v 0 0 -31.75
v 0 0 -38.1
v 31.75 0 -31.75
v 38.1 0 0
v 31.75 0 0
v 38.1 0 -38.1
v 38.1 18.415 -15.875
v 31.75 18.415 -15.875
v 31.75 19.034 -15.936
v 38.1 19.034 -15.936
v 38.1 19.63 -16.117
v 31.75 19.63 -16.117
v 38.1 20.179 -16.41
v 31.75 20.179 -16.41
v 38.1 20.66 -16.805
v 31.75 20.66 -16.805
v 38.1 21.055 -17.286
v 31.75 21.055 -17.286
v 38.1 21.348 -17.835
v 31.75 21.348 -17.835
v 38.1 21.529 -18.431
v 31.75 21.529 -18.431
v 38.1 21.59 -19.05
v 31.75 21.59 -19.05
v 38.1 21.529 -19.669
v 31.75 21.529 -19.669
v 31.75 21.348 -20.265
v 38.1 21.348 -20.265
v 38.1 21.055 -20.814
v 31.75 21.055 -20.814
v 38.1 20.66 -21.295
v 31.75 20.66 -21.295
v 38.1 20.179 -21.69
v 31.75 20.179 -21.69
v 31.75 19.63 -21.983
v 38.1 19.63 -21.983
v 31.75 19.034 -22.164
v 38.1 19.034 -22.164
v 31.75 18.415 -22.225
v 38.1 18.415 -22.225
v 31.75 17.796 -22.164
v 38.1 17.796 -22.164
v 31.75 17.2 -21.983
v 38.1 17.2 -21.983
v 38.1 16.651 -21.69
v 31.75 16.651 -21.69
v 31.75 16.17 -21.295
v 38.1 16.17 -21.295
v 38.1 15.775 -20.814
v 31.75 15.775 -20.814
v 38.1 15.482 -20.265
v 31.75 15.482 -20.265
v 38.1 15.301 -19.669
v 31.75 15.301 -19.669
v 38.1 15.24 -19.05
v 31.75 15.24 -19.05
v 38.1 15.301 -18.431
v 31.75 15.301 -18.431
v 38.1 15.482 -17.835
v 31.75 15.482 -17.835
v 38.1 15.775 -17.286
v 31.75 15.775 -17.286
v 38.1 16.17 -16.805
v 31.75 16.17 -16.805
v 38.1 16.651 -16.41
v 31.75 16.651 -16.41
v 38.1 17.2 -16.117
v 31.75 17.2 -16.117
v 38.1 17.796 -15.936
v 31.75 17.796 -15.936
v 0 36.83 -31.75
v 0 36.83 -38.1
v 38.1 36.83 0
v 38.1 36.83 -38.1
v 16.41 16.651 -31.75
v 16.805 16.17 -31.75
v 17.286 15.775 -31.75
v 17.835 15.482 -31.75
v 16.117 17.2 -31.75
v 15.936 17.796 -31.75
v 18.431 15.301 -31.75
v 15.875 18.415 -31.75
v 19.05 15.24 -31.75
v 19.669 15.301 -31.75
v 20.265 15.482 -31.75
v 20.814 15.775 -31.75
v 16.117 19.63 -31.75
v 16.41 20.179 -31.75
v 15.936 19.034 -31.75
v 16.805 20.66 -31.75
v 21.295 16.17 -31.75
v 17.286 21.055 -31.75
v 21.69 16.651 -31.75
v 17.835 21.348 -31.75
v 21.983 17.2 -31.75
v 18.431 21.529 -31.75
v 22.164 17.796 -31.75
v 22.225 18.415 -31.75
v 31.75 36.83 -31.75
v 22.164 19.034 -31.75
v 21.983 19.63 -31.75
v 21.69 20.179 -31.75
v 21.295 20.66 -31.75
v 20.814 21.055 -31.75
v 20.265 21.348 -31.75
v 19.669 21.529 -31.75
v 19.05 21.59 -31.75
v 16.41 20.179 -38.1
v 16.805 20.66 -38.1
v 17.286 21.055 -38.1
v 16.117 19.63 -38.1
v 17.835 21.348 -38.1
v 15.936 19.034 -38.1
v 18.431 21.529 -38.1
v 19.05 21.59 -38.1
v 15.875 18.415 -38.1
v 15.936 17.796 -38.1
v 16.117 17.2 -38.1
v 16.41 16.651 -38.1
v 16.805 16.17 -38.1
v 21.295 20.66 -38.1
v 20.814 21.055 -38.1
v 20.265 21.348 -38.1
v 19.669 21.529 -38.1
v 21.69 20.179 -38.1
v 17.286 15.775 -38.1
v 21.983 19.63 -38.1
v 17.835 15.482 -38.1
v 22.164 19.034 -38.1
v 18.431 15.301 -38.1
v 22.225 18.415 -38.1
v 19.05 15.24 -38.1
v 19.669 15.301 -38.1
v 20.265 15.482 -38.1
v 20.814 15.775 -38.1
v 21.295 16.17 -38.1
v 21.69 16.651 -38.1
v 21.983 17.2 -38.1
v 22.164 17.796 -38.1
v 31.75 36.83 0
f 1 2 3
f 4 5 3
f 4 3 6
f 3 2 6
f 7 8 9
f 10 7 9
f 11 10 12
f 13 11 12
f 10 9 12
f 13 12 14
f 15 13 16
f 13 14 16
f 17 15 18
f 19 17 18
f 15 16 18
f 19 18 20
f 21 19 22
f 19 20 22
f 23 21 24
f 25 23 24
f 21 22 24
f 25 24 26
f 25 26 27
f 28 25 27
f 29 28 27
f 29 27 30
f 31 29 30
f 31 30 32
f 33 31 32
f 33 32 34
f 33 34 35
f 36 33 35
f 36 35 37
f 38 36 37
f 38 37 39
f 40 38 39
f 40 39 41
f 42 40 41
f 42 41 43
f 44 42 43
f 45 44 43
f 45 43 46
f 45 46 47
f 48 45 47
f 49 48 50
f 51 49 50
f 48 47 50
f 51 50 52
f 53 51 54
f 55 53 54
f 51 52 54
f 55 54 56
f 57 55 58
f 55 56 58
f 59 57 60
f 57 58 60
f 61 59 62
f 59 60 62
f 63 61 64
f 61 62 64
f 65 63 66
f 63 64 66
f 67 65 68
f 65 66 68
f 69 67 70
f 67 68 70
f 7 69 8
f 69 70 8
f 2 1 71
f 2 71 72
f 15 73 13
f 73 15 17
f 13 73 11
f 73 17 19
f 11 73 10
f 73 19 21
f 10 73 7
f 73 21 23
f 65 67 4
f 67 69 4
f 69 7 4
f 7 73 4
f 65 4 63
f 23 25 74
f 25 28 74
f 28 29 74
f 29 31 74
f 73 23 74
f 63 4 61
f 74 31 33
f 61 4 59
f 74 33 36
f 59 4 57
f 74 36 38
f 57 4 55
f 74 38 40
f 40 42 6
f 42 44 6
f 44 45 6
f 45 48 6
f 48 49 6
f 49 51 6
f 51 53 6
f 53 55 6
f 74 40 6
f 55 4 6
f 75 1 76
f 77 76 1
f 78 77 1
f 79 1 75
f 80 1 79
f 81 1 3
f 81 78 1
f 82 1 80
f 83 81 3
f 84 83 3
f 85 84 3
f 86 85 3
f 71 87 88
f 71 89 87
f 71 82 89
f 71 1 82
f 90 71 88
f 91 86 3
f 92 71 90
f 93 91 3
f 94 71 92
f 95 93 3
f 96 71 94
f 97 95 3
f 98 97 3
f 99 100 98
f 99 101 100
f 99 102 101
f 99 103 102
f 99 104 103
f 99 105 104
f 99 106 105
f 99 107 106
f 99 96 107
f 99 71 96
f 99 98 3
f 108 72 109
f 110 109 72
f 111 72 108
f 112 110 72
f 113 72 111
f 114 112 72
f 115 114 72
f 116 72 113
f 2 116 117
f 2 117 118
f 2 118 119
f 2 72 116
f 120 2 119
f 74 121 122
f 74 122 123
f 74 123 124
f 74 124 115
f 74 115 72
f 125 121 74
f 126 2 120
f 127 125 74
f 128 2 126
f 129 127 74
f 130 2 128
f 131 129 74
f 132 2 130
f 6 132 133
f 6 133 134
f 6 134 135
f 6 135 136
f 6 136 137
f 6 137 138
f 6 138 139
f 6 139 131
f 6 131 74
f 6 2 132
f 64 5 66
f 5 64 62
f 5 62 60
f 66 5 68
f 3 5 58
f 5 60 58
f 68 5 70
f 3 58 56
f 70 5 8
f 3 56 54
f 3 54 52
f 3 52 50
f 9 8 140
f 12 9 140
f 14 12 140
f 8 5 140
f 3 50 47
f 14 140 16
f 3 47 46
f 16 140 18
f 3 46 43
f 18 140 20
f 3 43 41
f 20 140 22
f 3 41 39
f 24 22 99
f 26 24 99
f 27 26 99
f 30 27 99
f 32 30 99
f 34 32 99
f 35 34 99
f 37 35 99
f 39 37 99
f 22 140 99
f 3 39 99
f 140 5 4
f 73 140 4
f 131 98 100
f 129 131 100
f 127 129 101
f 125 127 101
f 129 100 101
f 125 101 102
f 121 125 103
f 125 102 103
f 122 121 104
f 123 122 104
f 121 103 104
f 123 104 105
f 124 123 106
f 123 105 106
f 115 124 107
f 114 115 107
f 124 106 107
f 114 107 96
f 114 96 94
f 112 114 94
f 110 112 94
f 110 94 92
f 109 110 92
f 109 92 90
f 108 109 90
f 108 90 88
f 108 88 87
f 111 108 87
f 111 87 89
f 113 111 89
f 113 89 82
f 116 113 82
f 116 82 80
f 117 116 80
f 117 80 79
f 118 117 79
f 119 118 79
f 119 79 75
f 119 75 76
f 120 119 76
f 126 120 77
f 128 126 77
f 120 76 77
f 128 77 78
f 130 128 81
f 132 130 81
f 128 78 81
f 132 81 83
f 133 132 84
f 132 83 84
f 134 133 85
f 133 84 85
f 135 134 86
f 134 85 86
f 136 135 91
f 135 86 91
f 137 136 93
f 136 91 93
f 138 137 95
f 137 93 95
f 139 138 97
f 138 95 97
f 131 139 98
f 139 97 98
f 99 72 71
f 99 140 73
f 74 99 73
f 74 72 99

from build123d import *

# Parameters (mm, degrees)
SKETCH1_W           = 38.1
SKETCH1_H           = 38.1
BOSS_EXTRUDE1_DEPTH = 36.83
SKETCH2_W           = 31.75
SKETCH2_H           = 31.75
CUT_EXTRUDE1_DEPTH  = 66.266139
SKETCH4_R           = 3.175
CUT_EXTRUDE2_DEPTH  = 62.774763456
SKETCH3_R           = 3.175
CUT_EXTRUDE3_DEPTH  = 62.774763456


with BuildPart() as part:
    # Sketch1 → Boss-Extrude1 (new body)
    with BuildSketch(Plane(origin=(0, 0, 0), x_dir=(1, 0, 0), z_dir=(0, 1, 0))):
        with Locations((19.05, 19.05)):
            Rectangle(SKETCH1_W, SKETCH1_H)
    extrude(amount=BOSS_EXTRUDE1_DEPTH)

    # Sketch2 → Cut-Extrude1 (cut, through all)
    with BuildSketch(Plane(origin=(0, 36.83, 0), x_dir=(1, 0, 0), z_dir=(0, 1, 0))):
        with Locations((15.875, 15.875)):
            Rectangle(SKETCH2_W, SKETCH2_H)
    extrude(amount=-CUT_EXTRUDE1_DEPTH, mode=Mode.SUBTRACT)

    # Sketch4 → Cut-Extrude2 (cut, through all)
    with BuildSketch(Plane.ZY.offset(-31.75)):
        with Locations((-19.05, 18.415)):
            Circle(SKETCH4_R)
    extrude(amount=-CUT_EXTRUDE2_DEPTH, mode=Mode.SUBTRACT)

    # Sketch3 → Cut-Extrude3 (cut, through all)
    with BuildSketch(Plane.XY.offset(-31.75)):
        with Locations((19.05, 18.415)):
            Circle(SKETCH3_R)
    extrude(amount=-CUT_EXTRUDE3_DEPTH, mode=Mode.SUBTRACT)


solid = part.part
